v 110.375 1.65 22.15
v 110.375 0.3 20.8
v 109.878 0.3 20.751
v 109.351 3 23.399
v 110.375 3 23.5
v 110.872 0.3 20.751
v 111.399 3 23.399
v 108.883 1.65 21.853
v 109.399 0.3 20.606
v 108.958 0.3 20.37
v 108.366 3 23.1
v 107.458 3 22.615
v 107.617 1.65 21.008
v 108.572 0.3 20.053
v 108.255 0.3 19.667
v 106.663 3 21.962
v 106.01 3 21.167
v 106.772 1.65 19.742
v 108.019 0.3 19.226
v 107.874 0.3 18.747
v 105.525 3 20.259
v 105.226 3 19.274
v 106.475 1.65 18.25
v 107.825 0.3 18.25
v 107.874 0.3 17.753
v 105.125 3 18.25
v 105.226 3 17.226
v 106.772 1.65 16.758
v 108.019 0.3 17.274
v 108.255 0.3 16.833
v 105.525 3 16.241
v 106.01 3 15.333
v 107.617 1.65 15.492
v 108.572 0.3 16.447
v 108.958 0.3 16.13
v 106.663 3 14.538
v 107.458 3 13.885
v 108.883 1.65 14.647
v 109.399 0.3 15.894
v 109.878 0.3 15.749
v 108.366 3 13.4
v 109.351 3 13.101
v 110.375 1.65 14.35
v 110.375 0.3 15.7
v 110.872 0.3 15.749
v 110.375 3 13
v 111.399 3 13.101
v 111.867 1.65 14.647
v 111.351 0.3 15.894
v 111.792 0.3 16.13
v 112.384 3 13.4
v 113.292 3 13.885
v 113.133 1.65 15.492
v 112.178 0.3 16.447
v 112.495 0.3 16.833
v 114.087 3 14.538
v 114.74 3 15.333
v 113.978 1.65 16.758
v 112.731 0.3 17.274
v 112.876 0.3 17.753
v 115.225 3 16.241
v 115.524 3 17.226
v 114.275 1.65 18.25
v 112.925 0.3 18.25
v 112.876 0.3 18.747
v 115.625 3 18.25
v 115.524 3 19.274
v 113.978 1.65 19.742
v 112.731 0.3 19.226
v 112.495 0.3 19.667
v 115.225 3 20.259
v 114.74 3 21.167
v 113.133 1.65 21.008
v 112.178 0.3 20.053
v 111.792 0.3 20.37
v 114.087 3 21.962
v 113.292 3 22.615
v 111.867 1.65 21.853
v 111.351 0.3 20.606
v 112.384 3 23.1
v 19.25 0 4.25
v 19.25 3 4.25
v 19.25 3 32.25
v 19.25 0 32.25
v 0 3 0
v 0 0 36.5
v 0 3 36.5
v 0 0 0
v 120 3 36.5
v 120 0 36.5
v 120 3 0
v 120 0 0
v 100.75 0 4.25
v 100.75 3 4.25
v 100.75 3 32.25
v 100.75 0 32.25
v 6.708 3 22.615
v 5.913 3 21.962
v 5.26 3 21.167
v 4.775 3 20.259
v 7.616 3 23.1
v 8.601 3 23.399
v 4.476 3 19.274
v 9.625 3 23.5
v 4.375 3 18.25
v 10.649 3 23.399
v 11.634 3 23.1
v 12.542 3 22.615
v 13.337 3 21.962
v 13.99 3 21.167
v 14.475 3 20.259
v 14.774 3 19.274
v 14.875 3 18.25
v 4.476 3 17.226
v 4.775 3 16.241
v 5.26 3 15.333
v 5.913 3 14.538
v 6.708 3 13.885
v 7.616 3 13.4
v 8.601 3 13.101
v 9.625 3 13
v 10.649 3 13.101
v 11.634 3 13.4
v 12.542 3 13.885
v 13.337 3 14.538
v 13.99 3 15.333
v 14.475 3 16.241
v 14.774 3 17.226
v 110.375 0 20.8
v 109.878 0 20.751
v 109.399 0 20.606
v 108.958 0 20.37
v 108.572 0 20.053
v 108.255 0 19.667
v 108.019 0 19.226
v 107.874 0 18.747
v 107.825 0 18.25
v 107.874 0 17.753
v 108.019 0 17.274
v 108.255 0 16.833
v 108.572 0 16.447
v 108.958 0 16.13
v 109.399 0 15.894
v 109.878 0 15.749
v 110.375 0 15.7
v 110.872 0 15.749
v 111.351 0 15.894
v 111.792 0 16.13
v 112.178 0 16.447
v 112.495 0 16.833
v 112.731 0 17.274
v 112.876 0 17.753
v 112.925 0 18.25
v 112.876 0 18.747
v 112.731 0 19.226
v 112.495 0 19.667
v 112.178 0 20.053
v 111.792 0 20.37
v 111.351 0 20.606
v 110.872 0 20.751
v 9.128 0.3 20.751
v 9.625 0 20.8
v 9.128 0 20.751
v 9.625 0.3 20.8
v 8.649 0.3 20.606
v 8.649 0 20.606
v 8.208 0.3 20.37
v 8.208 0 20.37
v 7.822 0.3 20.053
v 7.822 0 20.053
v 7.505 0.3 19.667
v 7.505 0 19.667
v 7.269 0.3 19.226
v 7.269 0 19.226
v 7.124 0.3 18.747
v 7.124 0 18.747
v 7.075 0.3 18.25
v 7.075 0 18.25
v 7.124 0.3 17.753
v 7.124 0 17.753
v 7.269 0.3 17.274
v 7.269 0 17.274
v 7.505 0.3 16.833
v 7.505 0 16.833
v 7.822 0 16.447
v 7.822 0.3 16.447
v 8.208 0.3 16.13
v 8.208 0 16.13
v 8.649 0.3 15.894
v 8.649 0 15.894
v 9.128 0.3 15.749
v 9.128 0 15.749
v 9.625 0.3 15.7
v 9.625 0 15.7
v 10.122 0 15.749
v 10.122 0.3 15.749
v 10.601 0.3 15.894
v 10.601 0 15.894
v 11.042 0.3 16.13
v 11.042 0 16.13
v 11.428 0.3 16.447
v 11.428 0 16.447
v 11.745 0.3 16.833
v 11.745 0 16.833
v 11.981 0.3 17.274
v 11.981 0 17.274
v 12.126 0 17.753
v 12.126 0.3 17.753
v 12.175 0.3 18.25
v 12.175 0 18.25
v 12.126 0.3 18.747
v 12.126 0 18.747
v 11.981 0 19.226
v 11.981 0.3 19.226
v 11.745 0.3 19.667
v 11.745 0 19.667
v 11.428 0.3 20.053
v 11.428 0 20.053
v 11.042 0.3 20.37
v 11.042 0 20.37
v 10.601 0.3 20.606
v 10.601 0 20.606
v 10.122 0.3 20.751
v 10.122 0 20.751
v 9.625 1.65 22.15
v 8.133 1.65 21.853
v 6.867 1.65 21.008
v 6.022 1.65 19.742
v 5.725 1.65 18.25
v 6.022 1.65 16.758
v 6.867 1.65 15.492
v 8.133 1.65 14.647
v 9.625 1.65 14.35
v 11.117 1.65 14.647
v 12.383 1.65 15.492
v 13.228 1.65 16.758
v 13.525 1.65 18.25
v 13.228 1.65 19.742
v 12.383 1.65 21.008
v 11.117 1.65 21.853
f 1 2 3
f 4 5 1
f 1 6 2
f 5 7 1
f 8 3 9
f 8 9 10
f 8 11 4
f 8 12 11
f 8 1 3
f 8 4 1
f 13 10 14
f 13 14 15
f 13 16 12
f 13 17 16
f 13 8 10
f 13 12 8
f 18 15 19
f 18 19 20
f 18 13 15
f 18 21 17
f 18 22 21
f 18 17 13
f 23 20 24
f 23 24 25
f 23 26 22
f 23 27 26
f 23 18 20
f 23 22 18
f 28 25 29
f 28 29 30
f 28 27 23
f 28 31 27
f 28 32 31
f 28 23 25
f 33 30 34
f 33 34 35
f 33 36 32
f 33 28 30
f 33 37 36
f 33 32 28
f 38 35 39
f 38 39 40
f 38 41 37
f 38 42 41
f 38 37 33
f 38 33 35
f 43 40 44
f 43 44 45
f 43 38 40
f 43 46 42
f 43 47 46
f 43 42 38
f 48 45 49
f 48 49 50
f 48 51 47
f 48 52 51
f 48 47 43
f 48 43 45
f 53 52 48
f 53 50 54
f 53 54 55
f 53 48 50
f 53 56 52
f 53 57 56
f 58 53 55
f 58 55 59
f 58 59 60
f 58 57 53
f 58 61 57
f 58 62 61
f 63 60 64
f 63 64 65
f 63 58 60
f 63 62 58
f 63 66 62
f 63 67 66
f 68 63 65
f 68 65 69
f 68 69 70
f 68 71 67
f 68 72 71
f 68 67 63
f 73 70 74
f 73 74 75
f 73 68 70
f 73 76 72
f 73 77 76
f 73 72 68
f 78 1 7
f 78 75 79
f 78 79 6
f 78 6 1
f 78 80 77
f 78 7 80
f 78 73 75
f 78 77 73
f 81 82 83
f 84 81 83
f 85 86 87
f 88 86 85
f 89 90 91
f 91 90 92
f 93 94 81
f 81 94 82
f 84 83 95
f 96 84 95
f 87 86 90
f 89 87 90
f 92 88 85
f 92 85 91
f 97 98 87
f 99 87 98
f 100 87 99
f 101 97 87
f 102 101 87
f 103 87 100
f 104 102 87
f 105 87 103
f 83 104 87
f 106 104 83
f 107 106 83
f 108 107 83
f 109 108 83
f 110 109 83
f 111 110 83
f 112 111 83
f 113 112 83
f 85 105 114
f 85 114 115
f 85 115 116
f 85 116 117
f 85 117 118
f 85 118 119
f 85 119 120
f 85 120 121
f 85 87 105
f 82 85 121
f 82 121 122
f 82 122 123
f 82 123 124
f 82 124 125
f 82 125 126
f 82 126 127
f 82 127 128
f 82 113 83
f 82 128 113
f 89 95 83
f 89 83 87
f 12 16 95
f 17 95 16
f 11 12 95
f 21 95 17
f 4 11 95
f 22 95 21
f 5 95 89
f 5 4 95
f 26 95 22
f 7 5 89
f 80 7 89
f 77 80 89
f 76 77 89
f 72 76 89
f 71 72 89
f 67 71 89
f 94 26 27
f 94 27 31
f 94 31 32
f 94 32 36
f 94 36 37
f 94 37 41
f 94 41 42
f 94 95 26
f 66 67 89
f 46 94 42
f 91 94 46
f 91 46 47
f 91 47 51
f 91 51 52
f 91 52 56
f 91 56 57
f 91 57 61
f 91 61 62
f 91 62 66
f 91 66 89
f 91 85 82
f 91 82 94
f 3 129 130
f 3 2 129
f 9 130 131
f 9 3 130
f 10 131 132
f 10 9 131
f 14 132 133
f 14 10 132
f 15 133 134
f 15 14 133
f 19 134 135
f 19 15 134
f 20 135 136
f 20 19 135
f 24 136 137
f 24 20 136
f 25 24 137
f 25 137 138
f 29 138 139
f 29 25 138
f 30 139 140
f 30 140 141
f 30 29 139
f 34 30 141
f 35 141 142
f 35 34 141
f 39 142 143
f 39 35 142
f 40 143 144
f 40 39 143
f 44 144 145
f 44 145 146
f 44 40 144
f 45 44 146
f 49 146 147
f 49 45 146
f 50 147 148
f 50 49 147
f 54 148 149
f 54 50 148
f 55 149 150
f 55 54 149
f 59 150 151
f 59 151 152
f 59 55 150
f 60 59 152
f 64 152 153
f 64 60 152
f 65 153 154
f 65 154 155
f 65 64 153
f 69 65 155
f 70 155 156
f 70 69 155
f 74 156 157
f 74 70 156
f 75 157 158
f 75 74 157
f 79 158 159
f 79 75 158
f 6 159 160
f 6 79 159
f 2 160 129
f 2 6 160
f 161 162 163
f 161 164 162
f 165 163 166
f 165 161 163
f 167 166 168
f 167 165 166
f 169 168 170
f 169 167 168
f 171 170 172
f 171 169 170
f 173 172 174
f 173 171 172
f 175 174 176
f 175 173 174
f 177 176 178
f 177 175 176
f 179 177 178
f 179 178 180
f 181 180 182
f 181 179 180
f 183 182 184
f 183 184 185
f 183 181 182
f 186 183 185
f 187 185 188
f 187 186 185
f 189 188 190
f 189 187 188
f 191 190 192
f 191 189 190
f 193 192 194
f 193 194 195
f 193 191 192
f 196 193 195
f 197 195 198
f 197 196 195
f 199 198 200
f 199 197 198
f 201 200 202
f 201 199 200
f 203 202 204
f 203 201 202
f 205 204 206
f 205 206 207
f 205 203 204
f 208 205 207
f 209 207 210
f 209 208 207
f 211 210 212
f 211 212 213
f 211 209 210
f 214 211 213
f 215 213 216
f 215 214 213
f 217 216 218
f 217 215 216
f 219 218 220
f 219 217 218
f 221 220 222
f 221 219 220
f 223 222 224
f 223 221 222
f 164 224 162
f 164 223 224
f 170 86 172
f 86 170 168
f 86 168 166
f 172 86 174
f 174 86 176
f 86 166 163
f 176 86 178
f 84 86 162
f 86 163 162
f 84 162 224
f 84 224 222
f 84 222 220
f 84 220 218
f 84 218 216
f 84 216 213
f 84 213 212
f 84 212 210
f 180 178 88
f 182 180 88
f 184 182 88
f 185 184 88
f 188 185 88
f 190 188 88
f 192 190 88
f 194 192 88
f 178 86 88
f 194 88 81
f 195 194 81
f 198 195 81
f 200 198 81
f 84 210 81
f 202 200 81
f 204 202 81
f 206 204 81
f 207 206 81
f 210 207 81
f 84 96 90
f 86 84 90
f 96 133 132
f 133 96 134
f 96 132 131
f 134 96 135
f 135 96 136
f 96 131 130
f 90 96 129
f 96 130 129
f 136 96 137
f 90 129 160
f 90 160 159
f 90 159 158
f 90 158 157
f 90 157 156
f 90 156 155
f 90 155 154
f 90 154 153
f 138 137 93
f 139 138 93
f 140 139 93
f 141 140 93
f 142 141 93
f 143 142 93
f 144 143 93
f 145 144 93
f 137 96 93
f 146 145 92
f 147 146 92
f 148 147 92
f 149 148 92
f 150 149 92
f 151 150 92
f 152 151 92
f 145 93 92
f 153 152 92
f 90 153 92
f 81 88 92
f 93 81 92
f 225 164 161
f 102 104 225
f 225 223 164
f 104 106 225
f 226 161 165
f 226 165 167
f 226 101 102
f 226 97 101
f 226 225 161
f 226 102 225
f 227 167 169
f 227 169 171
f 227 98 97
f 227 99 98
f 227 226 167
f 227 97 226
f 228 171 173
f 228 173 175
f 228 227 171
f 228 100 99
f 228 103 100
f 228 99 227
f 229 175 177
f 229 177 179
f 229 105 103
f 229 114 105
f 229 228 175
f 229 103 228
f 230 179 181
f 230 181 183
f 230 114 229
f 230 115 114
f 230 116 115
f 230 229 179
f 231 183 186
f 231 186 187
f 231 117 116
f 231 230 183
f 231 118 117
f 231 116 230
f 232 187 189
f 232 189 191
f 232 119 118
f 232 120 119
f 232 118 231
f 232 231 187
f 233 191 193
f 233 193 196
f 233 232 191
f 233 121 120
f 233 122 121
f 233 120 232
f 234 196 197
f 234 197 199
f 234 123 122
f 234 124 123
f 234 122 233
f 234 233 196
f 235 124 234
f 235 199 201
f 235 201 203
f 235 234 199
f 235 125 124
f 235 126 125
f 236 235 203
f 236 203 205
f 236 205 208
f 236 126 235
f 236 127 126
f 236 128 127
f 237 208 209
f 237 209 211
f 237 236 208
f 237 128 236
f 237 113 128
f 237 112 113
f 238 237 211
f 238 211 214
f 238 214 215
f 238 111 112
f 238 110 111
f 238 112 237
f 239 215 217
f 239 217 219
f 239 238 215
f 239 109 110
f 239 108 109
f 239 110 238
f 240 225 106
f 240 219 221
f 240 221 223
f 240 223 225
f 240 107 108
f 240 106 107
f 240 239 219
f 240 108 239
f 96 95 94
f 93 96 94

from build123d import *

# Parameters (mm, degrees)
SKETCH1_W                                     = 120
SKETCH1_H                                     = 36.5
BOSS_EXTRUDE1_DEPTH                           = 3
CUT_EXTRUDE1_DEPTH                            = 4
CSK_FOR_5_OVAL_HEAD_MACHINE_SCREW1_AT_2_COUNT = 2
CSK_FOR_5_OVAL_HEAD_MACHINE_SCREW1_AT_2_PITCH = 100.75


with BuildPart() as part:
    # Sketch1 → Boss-Extrude1 (new body)
    with BuildSketch(Plane(origin=(0, 0, 0), x_dir=(1, 0, 0), z_dir=(0, 1, 0))):
        with Locations((60, -18.25)):
            Rectangle(SKETCH1_W, SKETCH1_H)
    extrude(amount=BOSS_EXTRUDE1_DEPTH)

    # Sketch2 → Cut-Extrude1 (cut, through all)
    with BuildSketch(Plane(origin=(0, 3, 0), x_dir=(1, 0, 0), z_dir=(0, 1, 0))):
        Polygon((19.25, -32.25), (100.75, -32.25), (100.75, -4.25), (60, -4.25), (19.25, -4.25), align=None)
    extrude(amount=-CUT_EXTRUDE1_DEPTH, mode=Mode.SUBTRACT)

    # Sketch6 → CSK for #5 Oval Head Machine Screw1 (revolve, cut)
    with BuildSketch(Plane(origin=(9.625, 3, 18.25), x_dir=(0, 0, 1), z_dir=(1, 0, 0))):
        Polygon((0, 0), (0, 3), (2.5499949, 3), (2.5499949, 2.7000073), (5.2500022, 0), align=None)
    csk_for_5_oval_head_machine_screw1 = revolve(axis=Axis((9.625, 9.35, 18.25), (0, -1, 0)), mode=Mode.SUBTRACT)

    # CSK for #5 Oval Head Machine Screw1 at 2: CSK for #5 Oval Head Machine Screw1 ×2
    with Locations(*[(i * CSK_FOR_5_OVAL_HEAD_MACHINE_SCREW1_AT_2_PITCH, 0, 0) for i in range(1, CSK_FOR_5_OVAL_HEAD_MACHINE_SCREW1_AT_2_COUNT)]):
        add(csk_for_5_oval_head_machine_screw1, mode=Mode.SUBTRACT)


solid = part.part
